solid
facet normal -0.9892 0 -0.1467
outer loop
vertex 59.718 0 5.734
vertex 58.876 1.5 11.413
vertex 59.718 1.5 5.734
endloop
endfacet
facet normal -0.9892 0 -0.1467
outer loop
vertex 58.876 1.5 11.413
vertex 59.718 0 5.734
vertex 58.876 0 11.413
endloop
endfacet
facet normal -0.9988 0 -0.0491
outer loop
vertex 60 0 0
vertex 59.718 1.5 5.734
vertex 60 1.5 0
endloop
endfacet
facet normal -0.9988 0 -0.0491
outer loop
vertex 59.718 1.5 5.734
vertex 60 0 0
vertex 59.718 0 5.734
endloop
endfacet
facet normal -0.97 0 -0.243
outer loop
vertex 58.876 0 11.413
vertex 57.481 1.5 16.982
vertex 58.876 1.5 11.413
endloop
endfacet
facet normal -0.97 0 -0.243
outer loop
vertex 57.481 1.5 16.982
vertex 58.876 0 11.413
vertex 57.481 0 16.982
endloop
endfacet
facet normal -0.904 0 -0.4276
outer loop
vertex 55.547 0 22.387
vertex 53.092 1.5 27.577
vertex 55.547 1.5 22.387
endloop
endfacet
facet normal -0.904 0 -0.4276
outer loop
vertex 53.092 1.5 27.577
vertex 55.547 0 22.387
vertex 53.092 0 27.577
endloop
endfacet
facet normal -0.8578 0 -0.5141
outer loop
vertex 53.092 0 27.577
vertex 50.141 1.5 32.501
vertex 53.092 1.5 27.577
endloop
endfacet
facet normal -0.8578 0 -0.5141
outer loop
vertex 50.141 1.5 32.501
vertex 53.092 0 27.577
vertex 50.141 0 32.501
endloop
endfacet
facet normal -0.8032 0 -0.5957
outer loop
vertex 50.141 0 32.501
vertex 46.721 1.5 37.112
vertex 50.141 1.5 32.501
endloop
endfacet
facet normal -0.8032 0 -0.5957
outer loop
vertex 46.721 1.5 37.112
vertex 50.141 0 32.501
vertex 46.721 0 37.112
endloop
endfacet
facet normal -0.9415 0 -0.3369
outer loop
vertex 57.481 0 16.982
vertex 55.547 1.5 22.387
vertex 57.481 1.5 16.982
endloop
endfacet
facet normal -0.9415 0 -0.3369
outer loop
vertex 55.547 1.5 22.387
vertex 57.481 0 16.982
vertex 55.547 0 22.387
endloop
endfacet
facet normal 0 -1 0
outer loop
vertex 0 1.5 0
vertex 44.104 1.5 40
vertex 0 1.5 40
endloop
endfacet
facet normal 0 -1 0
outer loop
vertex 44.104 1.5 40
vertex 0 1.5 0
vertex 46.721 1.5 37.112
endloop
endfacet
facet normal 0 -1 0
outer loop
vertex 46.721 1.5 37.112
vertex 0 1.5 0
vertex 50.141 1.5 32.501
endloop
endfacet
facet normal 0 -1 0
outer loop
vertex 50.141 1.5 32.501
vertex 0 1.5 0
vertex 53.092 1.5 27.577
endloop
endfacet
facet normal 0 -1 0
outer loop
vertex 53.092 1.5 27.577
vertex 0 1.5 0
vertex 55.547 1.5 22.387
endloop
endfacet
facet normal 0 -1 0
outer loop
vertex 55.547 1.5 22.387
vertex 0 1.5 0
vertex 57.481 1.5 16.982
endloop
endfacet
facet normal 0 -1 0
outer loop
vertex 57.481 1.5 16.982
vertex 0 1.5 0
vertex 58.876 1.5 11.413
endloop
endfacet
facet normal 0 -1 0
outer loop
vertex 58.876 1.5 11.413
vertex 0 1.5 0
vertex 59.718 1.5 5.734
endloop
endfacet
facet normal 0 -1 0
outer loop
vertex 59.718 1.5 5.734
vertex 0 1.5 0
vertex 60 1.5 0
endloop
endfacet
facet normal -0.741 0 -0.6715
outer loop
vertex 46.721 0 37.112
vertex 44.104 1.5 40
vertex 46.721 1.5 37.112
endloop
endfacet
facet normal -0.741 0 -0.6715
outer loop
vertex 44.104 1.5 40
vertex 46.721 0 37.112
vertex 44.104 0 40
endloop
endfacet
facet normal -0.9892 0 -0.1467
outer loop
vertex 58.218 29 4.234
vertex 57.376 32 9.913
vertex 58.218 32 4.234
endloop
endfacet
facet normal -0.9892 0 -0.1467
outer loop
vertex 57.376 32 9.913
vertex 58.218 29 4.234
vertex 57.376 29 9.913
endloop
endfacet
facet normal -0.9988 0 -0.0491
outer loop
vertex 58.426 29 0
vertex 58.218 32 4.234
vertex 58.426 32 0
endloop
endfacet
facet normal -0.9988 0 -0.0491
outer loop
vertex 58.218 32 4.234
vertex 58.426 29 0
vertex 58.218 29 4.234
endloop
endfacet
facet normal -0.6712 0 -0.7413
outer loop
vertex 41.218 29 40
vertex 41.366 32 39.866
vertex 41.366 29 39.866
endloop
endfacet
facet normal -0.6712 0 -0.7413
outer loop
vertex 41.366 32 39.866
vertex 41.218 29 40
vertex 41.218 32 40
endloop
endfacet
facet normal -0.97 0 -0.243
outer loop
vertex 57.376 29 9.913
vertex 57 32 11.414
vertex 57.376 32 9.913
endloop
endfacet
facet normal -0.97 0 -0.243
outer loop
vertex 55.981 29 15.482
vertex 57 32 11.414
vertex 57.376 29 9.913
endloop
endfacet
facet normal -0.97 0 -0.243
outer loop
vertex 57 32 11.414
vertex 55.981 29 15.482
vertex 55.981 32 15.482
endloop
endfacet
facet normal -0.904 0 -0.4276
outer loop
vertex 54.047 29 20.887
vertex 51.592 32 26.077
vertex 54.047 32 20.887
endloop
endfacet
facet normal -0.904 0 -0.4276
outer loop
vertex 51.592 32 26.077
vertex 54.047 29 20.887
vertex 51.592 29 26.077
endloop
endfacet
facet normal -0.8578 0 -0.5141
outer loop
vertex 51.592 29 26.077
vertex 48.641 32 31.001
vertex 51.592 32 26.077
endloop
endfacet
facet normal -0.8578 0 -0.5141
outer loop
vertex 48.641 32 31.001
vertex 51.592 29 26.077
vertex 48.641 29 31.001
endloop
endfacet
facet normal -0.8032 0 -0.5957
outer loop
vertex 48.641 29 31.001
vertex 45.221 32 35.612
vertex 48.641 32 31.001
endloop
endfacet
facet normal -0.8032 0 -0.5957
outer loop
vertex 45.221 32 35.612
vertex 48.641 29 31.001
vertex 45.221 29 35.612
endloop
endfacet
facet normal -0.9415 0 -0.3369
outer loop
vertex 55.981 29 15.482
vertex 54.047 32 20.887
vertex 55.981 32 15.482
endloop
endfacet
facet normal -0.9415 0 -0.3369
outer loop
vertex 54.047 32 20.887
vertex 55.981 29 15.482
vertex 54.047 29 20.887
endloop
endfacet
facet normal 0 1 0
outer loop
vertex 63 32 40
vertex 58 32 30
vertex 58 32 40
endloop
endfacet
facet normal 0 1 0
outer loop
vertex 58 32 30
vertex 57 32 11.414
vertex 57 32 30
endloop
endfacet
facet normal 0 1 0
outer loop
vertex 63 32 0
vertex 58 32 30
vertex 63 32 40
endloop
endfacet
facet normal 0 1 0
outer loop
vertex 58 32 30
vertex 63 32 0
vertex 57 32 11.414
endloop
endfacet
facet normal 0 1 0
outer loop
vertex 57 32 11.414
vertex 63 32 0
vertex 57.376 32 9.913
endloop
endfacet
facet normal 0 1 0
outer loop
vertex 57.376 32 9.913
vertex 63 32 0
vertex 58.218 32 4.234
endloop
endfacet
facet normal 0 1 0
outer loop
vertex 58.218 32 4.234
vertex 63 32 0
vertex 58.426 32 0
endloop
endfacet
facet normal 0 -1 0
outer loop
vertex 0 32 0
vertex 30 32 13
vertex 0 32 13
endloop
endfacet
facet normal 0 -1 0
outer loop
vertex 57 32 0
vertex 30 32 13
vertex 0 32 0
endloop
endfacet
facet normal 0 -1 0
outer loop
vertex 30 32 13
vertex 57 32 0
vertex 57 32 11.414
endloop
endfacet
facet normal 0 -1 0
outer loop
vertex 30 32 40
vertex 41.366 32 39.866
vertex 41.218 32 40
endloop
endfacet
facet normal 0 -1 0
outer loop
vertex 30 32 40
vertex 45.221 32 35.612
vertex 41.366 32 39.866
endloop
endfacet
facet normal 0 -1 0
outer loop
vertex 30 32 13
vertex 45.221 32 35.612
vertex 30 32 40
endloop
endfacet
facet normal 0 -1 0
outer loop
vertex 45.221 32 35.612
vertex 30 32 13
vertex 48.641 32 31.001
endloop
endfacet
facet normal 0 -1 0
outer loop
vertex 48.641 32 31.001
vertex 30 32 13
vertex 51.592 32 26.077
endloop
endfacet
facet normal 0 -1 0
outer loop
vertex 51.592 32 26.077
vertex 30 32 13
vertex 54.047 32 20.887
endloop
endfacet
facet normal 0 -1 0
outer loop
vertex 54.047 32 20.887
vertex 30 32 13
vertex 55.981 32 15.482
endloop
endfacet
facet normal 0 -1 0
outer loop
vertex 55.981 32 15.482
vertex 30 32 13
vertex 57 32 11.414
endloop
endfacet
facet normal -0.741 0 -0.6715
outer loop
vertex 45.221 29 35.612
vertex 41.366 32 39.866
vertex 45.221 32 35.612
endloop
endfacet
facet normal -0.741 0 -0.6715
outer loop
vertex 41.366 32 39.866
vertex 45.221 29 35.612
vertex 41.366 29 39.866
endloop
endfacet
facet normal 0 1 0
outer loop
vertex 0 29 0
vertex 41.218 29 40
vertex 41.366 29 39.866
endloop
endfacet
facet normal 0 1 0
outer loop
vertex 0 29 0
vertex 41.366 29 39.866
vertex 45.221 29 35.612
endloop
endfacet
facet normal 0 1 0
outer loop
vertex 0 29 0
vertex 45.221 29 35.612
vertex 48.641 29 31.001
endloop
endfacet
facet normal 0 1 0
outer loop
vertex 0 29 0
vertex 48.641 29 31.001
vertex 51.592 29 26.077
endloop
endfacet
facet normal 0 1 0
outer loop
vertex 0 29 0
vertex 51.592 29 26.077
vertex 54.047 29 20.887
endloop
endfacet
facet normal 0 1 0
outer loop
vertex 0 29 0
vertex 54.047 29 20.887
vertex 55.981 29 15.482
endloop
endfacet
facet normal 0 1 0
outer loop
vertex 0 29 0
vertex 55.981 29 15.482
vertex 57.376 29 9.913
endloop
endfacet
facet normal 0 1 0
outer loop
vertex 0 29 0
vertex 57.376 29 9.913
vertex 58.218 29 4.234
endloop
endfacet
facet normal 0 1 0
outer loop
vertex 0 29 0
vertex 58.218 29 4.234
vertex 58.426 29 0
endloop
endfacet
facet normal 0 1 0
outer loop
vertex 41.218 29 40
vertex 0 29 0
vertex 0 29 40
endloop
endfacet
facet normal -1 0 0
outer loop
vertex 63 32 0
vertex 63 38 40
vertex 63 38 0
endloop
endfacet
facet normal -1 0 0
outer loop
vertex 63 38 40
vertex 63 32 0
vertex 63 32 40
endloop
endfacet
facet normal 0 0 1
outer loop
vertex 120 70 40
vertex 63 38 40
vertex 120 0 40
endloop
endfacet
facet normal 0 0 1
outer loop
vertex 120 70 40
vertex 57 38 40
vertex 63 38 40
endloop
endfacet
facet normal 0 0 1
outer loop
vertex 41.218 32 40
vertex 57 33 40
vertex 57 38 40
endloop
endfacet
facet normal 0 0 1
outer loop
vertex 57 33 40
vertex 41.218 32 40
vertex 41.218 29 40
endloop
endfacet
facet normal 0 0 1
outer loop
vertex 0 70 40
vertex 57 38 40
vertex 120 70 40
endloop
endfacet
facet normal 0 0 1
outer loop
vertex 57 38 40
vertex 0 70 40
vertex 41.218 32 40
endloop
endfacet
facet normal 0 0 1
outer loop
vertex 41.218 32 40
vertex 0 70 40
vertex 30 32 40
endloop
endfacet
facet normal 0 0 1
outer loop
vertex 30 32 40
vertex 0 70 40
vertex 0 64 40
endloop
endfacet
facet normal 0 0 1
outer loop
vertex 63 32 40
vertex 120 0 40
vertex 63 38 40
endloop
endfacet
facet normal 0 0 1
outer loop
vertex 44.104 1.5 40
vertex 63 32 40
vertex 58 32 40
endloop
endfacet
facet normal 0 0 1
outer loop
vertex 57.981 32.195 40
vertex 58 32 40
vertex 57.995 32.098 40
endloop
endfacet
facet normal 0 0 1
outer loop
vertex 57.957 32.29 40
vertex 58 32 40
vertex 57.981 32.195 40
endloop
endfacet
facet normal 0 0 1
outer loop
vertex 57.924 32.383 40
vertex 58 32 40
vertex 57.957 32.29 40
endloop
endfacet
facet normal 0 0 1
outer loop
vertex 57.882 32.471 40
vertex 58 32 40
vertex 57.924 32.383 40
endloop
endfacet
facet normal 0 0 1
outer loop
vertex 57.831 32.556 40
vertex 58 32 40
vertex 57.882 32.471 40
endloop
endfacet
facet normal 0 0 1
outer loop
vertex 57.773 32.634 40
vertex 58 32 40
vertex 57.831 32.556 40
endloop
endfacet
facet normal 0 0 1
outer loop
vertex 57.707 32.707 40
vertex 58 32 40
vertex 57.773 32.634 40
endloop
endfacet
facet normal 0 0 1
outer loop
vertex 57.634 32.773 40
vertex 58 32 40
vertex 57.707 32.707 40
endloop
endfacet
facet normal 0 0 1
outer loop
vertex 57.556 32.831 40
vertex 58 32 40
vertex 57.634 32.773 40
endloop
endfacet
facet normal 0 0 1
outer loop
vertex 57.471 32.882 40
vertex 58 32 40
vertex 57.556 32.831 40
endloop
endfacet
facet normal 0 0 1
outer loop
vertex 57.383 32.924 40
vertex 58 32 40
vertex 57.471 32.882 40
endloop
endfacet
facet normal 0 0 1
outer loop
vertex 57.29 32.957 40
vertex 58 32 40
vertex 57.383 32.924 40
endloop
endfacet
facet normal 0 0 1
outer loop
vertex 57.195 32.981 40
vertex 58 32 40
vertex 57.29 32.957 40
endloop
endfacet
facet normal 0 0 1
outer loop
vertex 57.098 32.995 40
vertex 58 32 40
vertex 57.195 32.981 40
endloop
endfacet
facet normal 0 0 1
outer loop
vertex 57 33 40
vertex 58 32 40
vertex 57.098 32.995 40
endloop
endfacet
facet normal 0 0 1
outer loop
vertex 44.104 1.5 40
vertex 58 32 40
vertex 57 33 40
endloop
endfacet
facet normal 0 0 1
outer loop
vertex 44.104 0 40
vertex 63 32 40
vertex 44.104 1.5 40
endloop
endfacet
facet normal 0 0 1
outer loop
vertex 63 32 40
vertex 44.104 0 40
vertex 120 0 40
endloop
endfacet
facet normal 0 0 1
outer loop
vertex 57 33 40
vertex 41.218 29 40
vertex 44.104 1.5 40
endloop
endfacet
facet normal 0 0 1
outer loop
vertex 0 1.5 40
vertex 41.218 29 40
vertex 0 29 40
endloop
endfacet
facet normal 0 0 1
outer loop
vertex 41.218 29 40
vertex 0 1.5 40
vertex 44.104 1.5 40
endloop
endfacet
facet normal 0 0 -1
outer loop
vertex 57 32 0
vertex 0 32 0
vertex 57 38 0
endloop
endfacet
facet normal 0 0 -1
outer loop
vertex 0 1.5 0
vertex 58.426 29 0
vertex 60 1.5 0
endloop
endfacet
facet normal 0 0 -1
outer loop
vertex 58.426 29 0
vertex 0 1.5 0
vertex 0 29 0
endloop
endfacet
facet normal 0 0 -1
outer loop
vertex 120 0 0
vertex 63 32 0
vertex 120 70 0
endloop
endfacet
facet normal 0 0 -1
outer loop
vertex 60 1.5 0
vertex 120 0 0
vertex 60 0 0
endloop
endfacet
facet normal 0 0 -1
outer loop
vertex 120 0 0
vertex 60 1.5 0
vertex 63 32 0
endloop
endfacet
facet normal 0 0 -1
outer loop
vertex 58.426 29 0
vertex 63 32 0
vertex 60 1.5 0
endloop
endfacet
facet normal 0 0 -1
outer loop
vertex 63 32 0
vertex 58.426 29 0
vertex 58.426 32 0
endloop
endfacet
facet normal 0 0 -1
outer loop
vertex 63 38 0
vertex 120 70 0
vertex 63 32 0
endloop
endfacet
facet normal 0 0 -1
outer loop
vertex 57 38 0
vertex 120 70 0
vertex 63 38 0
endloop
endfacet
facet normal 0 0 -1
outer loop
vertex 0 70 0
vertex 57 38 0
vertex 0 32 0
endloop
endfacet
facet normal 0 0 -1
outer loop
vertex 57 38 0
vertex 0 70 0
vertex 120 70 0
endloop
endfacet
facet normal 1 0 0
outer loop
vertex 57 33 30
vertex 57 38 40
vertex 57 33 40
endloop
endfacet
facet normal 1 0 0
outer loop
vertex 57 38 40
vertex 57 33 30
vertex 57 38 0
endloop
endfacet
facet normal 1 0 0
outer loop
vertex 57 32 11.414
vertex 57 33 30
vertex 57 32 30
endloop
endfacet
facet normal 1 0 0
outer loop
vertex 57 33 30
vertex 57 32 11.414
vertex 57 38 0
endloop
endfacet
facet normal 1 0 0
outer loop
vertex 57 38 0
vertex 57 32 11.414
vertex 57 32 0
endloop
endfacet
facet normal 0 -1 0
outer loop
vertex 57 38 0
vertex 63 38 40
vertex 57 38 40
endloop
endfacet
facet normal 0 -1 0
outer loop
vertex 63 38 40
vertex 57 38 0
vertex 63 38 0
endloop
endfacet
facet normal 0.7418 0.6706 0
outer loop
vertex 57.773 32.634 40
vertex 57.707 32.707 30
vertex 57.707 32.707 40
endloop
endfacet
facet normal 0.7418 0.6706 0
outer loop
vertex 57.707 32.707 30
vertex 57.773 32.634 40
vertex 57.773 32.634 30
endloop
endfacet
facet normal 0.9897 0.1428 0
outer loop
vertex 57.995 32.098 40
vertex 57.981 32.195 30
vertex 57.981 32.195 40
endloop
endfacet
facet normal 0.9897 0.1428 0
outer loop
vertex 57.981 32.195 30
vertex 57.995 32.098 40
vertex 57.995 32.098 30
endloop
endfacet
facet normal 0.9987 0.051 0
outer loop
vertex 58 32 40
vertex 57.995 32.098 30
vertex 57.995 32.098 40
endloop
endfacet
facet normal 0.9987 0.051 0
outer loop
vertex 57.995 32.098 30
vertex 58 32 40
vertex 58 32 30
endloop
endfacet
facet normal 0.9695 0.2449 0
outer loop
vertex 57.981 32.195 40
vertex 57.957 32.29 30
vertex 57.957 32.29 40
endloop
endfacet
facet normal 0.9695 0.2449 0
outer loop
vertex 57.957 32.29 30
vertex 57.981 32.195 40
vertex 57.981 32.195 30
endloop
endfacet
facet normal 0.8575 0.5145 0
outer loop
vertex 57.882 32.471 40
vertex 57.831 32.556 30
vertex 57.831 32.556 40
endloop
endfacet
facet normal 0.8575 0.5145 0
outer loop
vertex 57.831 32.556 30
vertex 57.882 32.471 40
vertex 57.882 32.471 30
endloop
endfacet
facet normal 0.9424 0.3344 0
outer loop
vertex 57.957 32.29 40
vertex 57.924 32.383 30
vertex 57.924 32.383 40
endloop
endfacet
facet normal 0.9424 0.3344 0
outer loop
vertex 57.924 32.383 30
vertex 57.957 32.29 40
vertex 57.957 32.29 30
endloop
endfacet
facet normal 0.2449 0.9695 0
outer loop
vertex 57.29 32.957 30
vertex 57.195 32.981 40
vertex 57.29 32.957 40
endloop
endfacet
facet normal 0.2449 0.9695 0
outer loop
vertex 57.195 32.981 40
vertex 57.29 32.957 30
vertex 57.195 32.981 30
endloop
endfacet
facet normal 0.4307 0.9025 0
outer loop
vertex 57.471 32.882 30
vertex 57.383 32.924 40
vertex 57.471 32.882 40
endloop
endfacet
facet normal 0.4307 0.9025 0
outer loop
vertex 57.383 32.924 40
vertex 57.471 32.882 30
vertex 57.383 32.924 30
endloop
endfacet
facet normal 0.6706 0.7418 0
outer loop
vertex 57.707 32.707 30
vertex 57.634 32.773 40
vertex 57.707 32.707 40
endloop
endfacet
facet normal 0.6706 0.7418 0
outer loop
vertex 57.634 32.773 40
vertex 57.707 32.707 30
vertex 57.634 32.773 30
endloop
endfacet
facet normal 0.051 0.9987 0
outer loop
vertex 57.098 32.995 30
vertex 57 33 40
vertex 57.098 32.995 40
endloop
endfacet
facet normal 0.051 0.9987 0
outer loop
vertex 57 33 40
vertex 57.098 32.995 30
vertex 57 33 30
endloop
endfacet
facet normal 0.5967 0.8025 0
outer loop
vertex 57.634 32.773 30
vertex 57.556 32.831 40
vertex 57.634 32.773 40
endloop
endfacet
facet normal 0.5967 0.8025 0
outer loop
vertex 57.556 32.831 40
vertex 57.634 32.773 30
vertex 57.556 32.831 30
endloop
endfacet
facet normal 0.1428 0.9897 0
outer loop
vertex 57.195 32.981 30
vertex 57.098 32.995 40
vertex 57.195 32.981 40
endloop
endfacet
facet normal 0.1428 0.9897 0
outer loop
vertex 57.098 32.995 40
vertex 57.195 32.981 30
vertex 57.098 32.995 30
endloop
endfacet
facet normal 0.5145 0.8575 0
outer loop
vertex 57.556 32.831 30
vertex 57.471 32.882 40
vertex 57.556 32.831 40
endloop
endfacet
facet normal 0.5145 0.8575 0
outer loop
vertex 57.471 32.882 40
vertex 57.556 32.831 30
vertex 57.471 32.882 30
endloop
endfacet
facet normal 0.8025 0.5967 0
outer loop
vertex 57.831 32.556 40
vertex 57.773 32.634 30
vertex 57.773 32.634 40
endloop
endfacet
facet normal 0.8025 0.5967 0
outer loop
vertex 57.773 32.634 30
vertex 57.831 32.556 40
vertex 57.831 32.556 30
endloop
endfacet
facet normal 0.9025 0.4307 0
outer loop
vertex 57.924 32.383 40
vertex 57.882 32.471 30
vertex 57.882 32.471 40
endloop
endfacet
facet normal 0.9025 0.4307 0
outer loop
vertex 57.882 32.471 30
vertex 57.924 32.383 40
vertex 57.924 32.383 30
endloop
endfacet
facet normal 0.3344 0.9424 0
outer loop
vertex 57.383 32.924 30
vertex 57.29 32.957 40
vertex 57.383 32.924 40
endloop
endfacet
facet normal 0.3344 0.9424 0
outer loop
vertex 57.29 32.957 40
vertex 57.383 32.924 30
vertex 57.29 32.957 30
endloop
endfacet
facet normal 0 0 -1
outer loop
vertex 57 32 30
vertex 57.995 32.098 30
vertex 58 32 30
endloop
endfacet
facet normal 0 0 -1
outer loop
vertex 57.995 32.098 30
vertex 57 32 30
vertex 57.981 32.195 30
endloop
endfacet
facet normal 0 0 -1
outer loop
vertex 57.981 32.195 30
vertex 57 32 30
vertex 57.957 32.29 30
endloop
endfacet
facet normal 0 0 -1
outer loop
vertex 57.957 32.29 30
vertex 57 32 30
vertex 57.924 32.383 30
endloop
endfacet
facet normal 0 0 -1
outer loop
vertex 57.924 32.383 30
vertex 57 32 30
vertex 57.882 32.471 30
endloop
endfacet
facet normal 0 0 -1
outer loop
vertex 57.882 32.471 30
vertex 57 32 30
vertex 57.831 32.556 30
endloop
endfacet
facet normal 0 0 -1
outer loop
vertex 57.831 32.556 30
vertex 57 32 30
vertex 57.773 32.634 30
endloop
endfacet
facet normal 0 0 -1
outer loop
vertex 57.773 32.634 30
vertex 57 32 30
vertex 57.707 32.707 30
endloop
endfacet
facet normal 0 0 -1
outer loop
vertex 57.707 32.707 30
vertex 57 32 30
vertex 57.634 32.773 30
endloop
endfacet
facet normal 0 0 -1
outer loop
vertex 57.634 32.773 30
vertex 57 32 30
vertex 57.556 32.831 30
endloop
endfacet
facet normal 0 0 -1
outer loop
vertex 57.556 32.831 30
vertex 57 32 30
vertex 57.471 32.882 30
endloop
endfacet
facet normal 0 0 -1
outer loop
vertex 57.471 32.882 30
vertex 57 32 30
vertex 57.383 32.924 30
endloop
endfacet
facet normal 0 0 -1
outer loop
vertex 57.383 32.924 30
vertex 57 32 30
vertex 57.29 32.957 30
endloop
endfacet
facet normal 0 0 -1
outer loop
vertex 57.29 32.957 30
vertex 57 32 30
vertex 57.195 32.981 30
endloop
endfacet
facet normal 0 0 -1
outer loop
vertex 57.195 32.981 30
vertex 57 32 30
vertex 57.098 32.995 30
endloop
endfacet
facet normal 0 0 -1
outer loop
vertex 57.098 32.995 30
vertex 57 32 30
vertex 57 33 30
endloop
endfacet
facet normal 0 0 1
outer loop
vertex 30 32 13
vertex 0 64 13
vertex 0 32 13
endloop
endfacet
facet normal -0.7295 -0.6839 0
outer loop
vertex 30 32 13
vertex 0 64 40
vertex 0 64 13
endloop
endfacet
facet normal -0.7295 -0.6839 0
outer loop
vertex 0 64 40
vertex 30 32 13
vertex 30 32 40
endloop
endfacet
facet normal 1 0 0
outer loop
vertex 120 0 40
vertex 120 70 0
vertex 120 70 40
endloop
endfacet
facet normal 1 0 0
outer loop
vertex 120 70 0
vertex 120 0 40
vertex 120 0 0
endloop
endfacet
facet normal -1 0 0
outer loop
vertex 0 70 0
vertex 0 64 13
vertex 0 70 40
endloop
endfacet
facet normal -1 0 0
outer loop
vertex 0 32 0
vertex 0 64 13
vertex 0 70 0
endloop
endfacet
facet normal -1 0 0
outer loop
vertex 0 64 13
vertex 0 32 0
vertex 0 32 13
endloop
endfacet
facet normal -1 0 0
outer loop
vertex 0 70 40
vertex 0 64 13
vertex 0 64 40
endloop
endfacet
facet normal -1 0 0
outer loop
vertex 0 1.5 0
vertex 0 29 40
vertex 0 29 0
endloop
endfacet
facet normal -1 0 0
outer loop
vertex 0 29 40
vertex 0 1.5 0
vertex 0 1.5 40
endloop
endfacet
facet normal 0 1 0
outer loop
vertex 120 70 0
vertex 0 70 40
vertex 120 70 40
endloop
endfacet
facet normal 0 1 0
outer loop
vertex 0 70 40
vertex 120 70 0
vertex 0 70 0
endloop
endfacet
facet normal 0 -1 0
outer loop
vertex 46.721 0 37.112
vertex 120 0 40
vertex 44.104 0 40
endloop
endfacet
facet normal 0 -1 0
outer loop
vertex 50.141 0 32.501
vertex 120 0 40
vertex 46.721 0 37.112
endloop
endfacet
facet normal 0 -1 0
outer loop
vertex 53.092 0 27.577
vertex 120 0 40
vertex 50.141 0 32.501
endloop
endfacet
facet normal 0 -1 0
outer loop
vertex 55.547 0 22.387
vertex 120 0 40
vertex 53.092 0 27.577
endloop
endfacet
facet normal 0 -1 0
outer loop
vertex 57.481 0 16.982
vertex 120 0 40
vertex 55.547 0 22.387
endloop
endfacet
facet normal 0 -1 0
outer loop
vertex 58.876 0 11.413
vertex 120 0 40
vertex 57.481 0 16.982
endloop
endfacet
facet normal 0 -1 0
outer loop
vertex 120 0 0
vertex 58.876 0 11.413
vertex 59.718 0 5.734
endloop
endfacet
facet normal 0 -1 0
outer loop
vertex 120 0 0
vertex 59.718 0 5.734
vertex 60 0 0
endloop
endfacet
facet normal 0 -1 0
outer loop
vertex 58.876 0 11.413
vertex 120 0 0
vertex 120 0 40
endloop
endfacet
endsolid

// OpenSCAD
// Dimensions in millimetres
$fn = 64;
outer_width = 120;      // X outer dimension
outer_length = 70;     // Y outer dimension
outer_height = 40;     // Z outer dimension
wall_thickness = 3;    // Wall thickness
floor_thickness = 3;   // Floor thickness

// Platform dimensions
platform_length = 60;   // X length of platform (centred)
platform_depth = outer_length - wall_thickness * 2;  // Y depth (inner width)
platform_elevation = floor_thickness + 10;          // Z elevation above inner floor

// Buffer chamber electrode holes
hole_diameter = 2;
hole_z_position = 30;

module tank_wall() {
    translate([wall_thickness/2, wall_thickness/2, 0])
        rotate([90, 0, 0]) cylinder(h=outer_height - floor_thickness, r=(outer_width - wall_thickness)/2);
}

module tank_floor() {
    translate([-wall_thickness/2, wall_thickness/2, -floor_thickness/2])
        rotate([90, 0, 0]) cylinder(h=floor_thickness, r=(outer_length - wall_thickness)/2);
}

// Platform
module platform() {
    translate([0, outer_length / 2 - wall_thickness, floor_thickness + 10])
        linear_extrude(height=platform_depth)
            polygon(points=[
                [platform_length/2, 0],
                [-platform_length/2, 0],
                [-platform_length/2, platform_depth]
            ]);
}

// Buffer chamber cutouts and electrode holes
module buffer_holes() {
    // Left hole (X = -60 to 0)
    translate([-outer_width / 2 + wall_thickness, outer_length / 2 - wall_thickness, 0])
        difference() {
            cube([wall_thickness * 2, wall_thickness * 2, outer_height]);
            translate([0, 0, hole_z_position])
                cylinder(d=hole_diameter, h=(outer_height - hole_z_position));
        }

    // Right hole (X = 60 to 120)
    translate([outer_width / 2 - wall_thickness, outer_length / 2 - wall_thickness, 0])
        difference() {
            cube([wall_thickness * 2, wall_thickness * 2, outer_height]);
            translate([0, 0, hole_z_position])
                cylinder(d=hole_diameter, h=(outer_height - hole_z_position));
        }
}

// Main assembly
difference() {
    // Outer tank shell
    cube([outer_width, outer_length, outer_height]);

    // Subtract walls and floor
    union() {
        translate([wall_thickness/2, wall_thickness/2, 0])
            rotate([90, 0, 0]) cylinder(h=outer_height, r=(outer_width - wall_thickness)/2);
        translate([-wall_thickness/2, wall_thickness/2, 0])
            rotate([90, 0, 0]) cylinder(h=outer_height, r=(outer_length - wall_thickness)/2);

        // Subtract inner floor
        translate([0, outer_length / 2 - wall_thickness, -floor_thickness/2])
            rotate([90, 0, 0]) cylinder(h=floor_thickness, r=(outer_width - wall_thickness)/2);
    }

    // Platform and buffer holes
    union() {
        platform();
        buffer_holes();
    }
}
